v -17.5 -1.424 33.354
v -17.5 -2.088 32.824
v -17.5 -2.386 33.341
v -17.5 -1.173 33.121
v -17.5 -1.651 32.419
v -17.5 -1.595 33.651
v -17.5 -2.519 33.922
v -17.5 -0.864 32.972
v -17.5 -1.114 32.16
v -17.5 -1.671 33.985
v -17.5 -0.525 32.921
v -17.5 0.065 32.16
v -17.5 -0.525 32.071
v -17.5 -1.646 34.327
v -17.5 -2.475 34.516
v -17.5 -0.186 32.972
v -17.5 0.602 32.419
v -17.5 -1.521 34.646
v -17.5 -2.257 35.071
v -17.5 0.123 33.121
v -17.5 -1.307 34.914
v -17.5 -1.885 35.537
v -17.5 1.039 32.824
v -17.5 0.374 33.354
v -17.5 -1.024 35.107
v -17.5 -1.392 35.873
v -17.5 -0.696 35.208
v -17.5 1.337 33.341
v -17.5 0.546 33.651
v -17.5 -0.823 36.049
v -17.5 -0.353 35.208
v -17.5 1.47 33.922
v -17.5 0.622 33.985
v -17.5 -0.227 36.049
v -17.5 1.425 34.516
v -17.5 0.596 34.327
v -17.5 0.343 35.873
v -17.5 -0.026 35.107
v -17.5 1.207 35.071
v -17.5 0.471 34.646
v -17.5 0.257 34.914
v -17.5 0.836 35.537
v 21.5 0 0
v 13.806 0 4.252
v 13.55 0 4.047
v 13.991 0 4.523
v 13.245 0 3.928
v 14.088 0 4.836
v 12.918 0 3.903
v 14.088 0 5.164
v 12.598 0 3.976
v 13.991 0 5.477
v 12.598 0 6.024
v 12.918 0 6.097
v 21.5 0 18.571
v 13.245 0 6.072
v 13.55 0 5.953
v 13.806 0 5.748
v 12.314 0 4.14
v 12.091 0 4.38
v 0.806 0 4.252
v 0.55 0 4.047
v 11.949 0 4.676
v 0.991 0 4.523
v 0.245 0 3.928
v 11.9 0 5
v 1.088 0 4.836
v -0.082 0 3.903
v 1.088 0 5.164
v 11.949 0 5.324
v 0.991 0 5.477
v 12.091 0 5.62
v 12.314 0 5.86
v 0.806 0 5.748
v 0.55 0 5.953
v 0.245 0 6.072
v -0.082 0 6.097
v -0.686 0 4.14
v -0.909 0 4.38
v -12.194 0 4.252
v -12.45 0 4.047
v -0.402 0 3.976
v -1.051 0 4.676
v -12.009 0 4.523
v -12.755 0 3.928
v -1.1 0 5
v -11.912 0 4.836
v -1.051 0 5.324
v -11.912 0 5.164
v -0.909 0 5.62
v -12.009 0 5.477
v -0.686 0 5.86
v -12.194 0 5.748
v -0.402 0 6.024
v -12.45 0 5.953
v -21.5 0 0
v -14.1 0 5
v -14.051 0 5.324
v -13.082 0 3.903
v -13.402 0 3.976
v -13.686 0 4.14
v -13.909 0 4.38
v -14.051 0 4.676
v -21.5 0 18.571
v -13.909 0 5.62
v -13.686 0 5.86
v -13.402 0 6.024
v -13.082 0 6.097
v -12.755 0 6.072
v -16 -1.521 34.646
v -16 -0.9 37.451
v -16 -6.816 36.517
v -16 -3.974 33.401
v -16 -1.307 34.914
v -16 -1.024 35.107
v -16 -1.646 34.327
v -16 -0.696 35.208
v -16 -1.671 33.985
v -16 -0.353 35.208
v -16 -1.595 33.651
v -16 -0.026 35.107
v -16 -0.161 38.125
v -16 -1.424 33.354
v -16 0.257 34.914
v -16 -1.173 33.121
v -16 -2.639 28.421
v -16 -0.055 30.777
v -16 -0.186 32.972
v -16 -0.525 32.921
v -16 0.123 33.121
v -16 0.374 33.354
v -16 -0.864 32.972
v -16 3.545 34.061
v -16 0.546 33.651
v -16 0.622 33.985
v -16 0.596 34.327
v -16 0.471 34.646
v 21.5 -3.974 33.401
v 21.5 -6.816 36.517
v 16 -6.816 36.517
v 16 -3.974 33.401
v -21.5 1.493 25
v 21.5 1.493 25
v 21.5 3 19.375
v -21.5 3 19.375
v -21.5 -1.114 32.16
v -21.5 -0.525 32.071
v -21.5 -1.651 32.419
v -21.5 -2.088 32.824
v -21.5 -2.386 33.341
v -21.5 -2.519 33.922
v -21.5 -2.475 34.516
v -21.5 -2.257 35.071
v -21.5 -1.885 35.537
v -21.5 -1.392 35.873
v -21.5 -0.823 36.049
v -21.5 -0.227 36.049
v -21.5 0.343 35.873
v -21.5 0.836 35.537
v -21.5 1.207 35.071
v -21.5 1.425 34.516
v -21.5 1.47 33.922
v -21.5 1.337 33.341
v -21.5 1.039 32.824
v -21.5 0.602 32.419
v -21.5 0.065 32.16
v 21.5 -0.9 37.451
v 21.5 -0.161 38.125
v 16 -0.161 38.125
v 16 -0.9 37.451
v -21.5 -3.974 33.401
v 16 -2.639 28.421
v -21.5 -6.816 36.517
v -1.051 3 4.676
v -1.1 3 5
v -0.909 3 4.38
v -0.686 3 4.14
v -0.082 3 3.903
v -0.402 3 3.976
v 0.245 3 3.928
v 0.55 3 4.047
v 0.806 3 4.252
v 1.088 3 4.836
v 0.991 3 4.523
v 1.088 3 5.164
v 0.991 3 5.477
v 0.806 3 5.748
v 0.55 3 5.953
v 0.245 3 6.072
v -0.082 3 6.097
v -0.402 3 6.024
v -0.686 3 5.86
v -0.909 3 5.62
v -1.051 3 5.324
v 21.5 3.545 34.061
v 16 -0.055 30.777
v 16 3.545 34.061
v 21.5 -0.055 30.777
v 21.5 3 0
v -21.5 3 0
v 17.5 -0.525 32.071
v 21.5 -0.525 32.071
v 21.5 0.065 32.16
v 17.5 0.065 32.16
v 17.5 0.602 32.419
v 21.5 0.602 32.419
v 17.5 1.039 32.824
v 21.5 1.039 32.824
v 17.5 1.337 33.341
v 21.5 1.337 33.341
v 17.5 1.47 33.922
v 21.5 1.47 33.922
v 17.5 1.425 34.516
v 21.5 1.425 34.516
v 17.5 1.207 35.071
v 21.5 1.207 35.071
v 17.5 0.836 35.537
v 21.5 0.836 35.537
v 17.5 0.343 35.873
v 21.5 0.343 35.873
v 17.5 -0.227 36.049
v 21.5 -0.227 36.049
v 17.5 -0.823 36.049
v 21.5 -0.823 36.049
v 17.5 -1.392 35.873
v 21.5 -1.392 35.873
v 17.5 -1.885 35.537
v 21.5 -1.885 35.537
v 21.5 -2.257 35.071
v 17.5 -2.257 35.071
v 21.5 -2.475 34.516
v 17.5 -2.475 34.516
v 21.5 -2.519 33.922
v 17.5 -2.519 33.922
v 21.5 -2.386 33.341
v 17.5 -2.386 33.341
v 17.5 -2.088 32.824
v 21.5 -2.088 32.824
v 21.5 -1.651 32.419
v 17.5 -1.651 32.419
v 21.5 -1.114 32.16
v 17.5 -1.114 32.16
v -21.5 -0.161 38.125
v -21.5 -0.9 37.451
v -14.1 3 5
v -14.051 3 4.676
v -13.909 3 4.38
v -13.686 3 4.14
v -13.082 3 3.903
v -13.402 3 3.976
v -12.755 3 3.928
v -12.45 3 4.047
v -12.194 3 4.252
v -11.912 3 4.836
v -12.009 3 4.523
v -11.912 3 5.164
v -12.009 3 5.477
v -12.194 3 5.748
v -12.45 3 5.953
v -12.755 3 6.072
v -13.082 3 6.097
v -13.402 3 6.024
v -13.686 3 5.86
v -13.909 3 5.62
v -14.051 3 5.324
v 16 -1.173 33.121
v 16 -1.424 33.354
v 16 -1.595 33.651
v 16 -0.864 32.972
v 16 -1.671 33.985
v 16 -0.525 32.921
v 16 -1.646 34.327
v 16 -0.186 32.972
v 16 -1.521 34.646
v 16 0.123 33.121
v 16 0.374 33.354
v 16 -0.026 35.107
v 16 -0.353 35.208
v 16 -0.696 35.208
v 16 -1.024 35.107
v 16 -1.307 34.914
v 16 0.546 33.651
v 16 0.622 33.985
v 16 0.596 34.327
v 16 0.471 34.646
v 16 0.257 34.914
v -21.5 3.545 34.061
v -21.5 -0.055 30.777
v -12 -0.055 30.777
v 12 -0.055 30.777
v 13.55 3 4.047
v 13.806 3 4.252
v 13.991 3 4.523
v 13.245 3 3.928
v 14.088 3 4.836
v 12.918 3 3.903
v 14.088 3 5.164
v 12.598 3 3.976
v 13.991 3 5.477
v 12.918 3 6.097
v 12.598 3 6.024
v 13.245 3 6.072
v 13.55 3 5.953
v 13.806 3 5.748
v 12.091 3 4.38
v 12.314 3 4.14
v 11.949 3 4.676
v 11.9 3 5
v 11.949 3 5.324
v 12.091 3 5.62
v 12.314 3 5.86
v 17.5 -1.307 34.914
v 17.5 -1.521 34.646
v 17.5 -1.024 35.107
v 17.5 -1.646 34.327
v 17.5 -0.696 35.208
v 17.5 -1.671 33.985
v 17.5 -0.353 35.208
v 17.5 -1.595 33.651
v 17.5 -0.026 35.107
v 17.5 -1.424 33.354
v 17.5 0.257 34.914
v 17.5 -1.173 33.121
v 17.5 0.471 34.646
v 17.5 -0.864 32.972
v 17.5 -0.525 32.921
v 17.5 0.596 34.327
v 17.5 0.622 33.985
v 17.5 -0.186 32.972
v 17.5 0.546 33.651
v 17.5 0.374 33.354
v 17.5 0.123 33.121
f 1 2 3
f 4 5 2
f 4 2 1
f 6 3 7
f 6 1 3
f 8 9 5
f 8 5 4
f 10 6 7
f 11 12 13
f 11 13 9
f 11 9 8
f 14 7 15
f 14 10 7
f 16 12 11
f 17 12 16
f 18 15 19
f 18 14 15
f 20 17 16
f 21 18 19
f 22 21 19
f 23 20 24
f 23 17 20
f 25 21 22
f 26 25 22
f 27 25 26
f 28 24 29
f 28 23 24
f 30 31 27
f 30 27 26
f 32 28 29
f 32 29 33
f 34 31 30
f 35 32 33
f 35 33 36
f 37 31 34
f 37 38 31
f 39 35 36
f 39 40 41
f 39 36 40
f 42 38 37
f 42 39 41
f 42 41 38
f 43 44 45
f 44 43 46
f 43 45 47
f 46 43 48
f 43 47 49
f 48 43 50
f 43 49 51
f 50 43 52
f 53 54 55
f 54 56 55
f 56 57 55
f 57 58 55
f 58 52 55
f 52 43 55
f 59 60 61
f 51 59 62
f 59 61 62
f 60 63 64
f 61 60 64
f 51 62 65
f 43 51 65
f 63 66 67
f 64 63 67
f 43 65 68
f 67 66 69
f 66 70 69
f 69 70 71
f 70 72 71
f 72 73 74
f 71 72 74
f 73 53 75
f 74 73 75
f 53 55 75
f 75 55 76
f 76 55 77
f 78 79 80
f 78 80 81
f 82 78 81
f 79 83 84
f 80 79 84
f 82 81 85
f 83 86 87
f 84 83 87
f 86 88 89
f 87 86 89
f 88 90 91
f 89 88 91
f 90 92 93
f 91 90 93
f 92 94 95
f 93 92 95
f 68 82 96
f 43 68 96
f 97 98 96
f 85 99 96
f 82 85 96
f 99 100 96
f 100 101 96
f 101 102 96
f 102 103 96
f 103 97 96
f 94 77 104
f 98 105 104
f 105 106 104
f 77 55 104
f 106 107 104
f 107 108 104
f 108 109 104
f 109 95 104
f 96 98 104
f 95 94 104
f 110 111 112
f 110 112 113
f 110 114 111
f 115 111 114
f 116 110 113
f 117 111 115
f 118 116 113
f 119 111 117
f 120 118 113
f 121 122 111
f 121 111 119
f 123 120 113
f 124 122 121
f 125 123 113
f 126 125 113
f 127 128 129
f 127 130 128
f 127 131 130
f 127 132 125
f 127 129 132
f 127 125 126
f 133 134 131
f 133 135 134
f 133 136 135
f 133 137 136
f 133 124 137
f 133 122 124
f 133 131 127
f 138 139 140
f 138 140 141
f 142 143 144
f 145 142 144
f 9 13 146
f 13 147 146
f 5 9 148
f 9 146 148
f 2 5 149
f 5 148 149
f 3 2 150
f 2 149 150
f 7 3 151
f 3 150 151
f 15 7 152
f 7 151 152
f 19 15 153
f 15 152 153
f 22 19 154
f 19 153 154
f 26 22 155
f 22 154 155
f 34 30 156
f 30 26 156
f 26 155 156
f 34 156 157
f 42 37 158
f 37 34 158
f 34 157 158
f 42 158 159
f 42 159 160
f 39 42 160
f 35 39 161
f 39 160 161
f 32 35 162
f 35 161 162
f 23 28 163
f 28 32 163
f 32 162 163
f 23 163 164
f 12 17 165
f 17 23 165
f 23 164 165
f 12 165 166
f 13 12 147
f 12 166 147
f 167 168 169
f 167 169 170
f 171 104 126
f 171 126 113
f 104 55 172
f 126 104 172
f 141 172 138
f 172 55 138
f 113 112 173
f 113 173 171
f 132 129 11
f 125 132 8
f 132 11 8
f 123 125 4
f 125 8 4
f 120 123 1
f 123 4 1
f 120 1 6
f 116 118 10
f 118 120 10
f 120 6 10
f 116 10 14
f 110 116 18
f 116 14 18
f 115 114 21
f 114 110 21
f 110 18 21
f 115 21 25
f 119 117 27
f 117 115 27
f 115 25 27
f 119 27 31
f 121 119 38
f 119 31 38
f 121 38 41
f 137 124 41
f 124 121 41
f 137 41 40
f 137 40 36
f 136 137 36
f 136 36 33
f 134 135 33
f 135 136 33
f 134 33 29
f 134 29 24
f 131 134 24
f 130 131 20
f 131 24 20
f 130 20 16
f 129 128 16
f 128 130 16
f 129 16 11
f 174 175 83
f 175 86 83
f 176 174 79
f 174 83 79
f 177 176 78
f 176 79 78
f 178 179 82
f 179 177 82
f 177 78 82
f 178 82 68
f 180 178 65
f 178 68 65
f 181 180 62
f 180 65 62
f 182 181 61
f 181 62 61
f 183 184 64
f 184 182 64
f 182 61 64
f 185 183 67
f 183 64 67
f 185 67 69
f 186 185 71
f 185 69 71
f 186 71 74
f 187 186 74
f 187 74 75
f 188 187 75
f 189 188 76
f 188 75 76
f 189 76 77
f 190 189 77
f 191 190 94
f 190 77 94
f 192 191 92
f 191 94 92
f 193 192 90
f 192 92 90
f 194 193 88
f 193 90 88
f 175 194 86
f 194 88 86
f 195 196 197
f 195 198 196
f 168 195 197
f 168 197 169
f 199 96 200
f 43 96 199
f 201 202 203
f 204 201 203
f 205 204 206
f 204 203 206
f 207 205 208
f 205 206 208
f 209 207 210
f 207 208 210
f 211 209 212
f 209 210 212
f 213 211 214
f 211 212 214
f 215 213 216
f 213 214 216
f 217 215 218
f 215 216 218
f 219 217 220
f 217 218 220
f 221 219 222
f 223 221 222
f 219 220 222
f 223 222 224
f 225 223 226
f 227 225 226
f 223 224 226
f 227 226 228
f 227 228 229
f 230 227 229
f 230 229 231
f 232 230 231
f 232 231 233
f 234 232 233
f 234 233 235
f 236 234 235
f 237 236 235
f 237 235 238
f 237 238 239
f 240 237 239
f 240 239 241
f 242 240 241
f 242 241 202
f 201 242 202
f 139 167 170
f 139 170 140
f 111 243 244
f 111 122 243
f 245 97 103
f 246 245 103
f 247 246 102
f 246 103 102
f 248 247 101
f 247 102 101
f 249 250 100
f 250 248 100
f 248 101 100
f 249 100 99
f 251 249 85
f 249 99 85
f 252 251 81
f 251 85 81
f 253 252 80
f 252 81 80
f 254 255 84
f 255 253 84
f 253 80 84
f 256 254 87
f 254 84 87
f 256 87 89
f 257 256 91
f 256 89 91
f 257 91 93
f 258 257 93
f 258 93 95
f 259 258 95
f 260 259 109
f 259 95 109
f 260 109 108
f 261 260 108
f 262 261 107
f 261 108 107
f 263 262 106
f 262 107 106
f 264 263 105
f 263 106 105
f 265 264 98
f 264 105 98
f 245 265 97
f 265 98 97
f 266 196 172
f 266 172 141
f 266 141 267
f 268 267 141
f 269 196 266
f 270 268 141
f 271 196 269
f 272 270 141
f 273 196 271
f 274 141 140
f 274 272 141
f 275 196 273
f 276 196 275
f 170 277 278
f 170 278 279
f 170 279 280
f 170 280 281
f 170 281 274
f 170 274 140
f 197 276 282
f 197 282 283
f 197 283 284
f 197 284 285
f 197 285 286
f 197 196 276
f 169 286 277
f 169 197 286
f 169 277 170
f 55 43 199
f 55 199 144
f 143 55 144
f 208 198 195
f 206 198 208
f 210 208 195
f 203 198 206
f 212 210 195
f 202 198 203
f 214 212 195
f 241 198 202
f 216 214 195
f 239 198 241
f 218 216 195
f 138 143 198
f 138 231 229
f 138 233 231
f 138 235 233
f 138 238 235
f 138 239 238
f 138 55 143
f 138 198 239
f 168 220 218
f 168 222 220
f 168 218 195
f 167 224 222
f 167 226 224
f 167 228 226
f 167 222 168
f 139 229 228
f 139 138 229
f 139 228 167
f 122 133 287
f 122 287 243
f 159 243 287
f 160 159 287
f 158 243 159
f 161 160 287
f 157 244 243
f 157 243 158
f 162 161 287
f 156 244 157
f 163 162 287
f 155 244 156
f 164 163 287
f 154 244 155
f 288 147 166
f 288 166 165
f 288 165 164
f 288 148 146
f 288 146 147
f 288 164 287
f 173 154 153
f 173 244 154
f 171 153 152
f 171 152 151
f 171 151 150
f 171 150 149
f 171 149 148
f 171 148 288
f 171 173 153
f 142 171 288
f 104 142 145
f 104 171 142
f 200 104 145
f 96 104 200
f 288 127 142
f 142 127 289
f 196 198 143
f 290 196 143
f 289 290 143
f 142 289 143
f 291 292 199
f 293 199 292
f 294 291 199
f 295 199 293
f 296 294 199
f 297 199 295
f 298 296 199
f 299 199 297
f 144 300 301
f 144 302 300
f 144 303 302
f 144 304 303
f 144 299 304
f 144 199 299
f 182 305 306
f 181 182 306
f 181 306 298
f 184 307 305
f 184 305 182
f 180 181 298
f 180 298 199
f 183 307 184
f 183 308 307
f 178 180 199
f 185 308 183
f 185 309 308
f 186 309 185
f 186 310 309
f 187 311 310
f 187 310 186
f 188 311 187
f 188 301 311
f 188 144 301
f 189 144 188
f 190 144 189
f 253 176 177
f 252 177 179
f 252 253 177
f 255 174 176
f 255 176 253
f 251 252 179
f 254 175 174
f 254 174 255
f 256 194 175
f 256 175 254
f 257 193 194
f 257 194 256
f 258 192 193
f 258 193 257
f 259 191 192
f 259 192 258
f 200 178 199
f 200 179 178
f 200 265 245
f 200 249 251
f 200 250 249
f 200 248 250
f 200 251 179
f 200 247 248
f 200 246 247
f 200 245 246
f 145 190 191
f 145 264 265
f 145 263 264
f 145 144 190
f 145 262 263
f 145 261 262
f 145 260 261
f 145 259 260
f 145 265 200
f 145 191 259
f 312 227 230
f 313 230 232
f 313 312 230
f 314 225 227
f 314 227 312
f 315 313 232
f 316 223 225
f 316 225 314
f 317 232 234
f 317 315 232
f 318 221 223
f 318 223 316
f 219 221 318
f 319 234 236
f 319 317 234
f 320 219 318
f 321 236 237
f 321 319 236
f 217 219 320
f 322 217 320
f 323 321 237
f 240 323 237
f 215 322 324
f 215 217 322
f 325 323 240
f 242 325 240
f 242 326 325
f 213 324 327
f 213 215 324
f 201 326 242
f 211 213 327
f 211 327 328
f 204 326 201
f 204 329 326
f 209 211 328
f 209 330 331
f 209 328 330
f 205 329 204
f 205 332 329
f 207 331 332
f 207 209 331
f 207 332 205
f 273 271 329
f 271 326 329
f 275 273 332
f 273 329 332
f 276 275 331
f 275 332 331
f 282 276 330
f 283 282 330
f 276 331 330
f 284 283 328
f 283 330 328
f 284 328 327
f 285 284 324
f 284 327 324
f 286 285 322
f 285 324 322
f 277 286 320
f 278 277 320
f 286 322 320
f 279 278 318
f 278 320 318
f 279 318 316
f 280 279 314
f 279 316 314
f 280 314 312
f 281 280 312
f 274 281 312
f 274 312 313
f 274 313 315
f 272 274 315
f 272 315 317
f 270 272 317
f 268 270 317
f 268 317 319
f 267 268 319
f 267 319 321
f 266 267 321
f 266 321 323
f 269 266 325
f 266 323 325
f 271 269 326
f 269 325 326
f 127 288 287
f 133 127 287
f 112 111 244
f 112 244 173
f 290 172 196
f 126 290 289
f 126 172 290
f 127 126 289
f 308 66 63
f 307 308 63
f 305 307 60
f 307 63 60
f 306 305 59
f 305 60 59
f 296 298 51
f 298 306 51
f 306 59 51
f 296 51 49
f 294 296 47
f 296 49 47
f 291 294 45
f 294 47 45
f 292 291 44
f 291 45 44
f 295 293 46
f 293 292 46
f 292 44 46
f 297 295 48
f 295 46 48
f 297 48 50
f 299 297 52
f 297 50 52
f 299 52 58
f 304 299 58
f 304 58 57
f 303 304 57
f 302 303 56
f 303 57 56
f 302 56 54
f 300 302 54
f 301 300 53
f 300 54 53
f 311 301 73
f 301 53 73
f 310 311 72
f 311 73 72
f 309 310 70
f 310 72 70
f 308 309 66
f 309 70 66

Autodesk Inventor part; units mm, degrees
ref_plane "YZ Plane" through (0, 0, 0) normal (1, 0, 0) x (0, 1, 0)
ref_plane "XZ Plane" through (0, 0, 0) normal (0, 1, 0) x (-1, 0, 0)
ref_plane "XY Plane" through (0, 0, 0) normal (0, 0, 1) x (1, 0, 0)
sketch "スケッチ1" plane through (0, 0, 0) normal (0, 1, 0) x (-1, 0, 0)
  line L0 (21.5, 0) -> (-21.5, 0)
  line L1 (-21.5, 0) -> (-21.5, 25)
  line L2 (-21.5, 25) -> (21.5, 25)
  line L3 (21.5, 25) -> (21.5, 0)
  circle A0 centre (0, 5) radius 1.1
  circle A1 centre (13, 5) radius 1.1
  circle A2 centre (-13, 5) radius 1.1
  line L4 (0, 0) -> (0, 25) construction
  dimension "d0" = 43
  dimension "d1" = 13
  dimension "d2" = 2.2
  dimension "d3" = 5
  dimension "d6" = 25
extrude "押し出し1" add sketch "スケッチ1" along normal blind 3
sketch "スケッチ2" plane through (21.5, 0, 25) normal (1, 0, 0) x (0, 0, -1)
  line L0 (5.6249, 3) -> (6.4287, 0)
  line L1 (6.4287, 0) -> (-12.8898, -5.1764)
  line L2 (-12.8898, -5.1764) -> (-13.6936, -2.1764)
  line L3 (-13.6936, -2.1764) -> (5.6249, 3)
  line L4 (0, 3) -> (25, 3) projected
  line L5 (0, 0) -> (25, 0) projected
  line L6 (6.134, 1.1) -> (-6.5703, -2.3041) construction
  dimension "d7" = 20
extrude "押し出し2" add sketch "スケッチ2" against normal up to surface (43 mm away)
sketch "スケッチ3" plane through (21.5, 0, 0) normal (1, 0, 0) x (0, 0, -1)
  line L0 (-36.517, -6.8159) -> (-30.0178, -0.888)
  line L1 (-30.0178, -0.888) -> (-34.0611, 3.545)
  line L2 (-34.0611, 3.545) -> (-38.1247, -0.1614)
  line L3 (-38.1247, -0.1614) -> (-37.4508, -0.9002)
  line L4 (-37.4508, -0.9002) -> (-36.517, -6.8159)
  line L5 (-25, 3) -> (0, 3) projected
  line L6 (-25, 1.4928) -> (-25, 3) projected
  line L7 (-25, 1.4928) -> (-38.6936, -2.1764) projected
  line L8 (-38.6936, -2.1764) -> (-37.8898, -5.1764) projected
  line L9 (-37.8898, -5.1764) -> (-18.5713, 0) projected
  line L10 (-18.5713, 0) -> (0, 0) projected
  line L11 (0, 0) -> (0, 3) projected
  line L12 (-25, 1.4928) -> (-19.3751, 3)
  line L13 (-25, 1.4928) -> (-38.6936, -2.1764) projected
  point P0 (0, 0)
  point P1 (-31.5703, -2.3041)
  point P2 (-36.821, -4.89)
  point P3 (-37.308, -1.8051)
  point P4 (-33.4007, -3.9735)
  point P5 (-30.7774, -0.0552)
extrude "押し出し3" cut sketch "スケッチ3" against normal through all contours L9 L8 L7 L4 | L6 L5 L12
extrude "押し出し4" add sketch "スケッチ3" against normal up to surface (43 mm away) contours L4 L9 L0 | L4 L3 L2 L1 L7
sketch "スケッチ4" plane through (0, 0, 0) normal (1, 0, 0) x (0, 1, 0)
  line L0 (-0.9002, 37.4508) -> (-6.8159, 36.517) projected
  line L1 (-6.8159, 36.517) -> (-3.9735, 33.4007) projected
  line L2 (-3.9735, 33.4007) -> (0, 18.5713) projected
  line L3 (0, 18.5713) -> (0, 0) projected
  line L4 (0, 0) -> (3, 0) projected
  line L5 (3, 19.3751) -> (3, 0) projected
  line L6 (3, 19.3751) -> (-0.0552, 30.7774) projected
  line L7 (-0.0552, 30.7774) -> (3.545, 34.0611) projected
  line L8 (3.545, 34.0611) -> (-0.1614, 38.1247) projected
  line L9 (-0.1614, 38.1247) -> (-0.9002, 37.4508) projected
  line L10 (-0.0552, 30.7774) -> (-2.6391, 28.4206)
  point P0 (0, 0)
extrude "押し出し5" cut sketch "スケッチ4" along normal mid plane 24 contours L9 L8 L7 L10 L2 L1 L0
sketch "スケッチ6" plane through (12, 0, 0) normal (-1, 0, 0) x (0, 0, 1)
  line L0 (33.4007, -3.9735) -> (28.4206, -2.6391) projected
  line L1 (36.517, -6.8159) -> (33.4007, -3.9735) projected
  line L2 (37.4508, -0.9002) -> (36.517, -6.8159) projected
  line L3 (38.1247, -0.1614) -> (37.4508, -0.9002) projected
  line L4 (34.0611, 3.545) -> (38.1247, -0.1614) projected
  line L5 (30.7774, -0.0552) -> (34.0611, 3.545) projected
  line L6 (28.4206, -2.6391) -> (30.7774, -0.0552) projected
  point P0 (0, 0)
extrude "押し出し7" cut sketch "スケッチ6" against normal blind 4
sketch "スケッチ7" plane through (21.5, 0, 0) normal (1, 0, 0) x (0, 0, -1)
  circle A0 centre (-34.0712, -0.5247) radius 0.8 construction
  circle A1 centre (-34.0712, -0.5247) radius 1.15
  point P0 (0, 0)
  dimension "d21" = 2.3
extrude "押し出し8" cut sketch "スケッチ7" against normal up to surface (5.5 mm away)
sketch "スケッチ8" plane through (21.5, 0, 0) normal (1, 0, 0) x (0, 0, -1)
  circle A0 centre (-34.0712, -0.5247) radius 1.15 projected
  circle A1 centre (-34.0712, -0.5247) radius 2
  point P0 (0, 0)
  dimension "d24" = 4
extrude "押し出し9" cut sketch "スケッチ8" against normal blind 4 contours A0 | A1
mirror "ミラー1" about plane through (0, 0, 0) normal (1, 0, 0) of "押し出し9", "押し出し8", "押し出し7"
properties part number "chest_cover_front"
